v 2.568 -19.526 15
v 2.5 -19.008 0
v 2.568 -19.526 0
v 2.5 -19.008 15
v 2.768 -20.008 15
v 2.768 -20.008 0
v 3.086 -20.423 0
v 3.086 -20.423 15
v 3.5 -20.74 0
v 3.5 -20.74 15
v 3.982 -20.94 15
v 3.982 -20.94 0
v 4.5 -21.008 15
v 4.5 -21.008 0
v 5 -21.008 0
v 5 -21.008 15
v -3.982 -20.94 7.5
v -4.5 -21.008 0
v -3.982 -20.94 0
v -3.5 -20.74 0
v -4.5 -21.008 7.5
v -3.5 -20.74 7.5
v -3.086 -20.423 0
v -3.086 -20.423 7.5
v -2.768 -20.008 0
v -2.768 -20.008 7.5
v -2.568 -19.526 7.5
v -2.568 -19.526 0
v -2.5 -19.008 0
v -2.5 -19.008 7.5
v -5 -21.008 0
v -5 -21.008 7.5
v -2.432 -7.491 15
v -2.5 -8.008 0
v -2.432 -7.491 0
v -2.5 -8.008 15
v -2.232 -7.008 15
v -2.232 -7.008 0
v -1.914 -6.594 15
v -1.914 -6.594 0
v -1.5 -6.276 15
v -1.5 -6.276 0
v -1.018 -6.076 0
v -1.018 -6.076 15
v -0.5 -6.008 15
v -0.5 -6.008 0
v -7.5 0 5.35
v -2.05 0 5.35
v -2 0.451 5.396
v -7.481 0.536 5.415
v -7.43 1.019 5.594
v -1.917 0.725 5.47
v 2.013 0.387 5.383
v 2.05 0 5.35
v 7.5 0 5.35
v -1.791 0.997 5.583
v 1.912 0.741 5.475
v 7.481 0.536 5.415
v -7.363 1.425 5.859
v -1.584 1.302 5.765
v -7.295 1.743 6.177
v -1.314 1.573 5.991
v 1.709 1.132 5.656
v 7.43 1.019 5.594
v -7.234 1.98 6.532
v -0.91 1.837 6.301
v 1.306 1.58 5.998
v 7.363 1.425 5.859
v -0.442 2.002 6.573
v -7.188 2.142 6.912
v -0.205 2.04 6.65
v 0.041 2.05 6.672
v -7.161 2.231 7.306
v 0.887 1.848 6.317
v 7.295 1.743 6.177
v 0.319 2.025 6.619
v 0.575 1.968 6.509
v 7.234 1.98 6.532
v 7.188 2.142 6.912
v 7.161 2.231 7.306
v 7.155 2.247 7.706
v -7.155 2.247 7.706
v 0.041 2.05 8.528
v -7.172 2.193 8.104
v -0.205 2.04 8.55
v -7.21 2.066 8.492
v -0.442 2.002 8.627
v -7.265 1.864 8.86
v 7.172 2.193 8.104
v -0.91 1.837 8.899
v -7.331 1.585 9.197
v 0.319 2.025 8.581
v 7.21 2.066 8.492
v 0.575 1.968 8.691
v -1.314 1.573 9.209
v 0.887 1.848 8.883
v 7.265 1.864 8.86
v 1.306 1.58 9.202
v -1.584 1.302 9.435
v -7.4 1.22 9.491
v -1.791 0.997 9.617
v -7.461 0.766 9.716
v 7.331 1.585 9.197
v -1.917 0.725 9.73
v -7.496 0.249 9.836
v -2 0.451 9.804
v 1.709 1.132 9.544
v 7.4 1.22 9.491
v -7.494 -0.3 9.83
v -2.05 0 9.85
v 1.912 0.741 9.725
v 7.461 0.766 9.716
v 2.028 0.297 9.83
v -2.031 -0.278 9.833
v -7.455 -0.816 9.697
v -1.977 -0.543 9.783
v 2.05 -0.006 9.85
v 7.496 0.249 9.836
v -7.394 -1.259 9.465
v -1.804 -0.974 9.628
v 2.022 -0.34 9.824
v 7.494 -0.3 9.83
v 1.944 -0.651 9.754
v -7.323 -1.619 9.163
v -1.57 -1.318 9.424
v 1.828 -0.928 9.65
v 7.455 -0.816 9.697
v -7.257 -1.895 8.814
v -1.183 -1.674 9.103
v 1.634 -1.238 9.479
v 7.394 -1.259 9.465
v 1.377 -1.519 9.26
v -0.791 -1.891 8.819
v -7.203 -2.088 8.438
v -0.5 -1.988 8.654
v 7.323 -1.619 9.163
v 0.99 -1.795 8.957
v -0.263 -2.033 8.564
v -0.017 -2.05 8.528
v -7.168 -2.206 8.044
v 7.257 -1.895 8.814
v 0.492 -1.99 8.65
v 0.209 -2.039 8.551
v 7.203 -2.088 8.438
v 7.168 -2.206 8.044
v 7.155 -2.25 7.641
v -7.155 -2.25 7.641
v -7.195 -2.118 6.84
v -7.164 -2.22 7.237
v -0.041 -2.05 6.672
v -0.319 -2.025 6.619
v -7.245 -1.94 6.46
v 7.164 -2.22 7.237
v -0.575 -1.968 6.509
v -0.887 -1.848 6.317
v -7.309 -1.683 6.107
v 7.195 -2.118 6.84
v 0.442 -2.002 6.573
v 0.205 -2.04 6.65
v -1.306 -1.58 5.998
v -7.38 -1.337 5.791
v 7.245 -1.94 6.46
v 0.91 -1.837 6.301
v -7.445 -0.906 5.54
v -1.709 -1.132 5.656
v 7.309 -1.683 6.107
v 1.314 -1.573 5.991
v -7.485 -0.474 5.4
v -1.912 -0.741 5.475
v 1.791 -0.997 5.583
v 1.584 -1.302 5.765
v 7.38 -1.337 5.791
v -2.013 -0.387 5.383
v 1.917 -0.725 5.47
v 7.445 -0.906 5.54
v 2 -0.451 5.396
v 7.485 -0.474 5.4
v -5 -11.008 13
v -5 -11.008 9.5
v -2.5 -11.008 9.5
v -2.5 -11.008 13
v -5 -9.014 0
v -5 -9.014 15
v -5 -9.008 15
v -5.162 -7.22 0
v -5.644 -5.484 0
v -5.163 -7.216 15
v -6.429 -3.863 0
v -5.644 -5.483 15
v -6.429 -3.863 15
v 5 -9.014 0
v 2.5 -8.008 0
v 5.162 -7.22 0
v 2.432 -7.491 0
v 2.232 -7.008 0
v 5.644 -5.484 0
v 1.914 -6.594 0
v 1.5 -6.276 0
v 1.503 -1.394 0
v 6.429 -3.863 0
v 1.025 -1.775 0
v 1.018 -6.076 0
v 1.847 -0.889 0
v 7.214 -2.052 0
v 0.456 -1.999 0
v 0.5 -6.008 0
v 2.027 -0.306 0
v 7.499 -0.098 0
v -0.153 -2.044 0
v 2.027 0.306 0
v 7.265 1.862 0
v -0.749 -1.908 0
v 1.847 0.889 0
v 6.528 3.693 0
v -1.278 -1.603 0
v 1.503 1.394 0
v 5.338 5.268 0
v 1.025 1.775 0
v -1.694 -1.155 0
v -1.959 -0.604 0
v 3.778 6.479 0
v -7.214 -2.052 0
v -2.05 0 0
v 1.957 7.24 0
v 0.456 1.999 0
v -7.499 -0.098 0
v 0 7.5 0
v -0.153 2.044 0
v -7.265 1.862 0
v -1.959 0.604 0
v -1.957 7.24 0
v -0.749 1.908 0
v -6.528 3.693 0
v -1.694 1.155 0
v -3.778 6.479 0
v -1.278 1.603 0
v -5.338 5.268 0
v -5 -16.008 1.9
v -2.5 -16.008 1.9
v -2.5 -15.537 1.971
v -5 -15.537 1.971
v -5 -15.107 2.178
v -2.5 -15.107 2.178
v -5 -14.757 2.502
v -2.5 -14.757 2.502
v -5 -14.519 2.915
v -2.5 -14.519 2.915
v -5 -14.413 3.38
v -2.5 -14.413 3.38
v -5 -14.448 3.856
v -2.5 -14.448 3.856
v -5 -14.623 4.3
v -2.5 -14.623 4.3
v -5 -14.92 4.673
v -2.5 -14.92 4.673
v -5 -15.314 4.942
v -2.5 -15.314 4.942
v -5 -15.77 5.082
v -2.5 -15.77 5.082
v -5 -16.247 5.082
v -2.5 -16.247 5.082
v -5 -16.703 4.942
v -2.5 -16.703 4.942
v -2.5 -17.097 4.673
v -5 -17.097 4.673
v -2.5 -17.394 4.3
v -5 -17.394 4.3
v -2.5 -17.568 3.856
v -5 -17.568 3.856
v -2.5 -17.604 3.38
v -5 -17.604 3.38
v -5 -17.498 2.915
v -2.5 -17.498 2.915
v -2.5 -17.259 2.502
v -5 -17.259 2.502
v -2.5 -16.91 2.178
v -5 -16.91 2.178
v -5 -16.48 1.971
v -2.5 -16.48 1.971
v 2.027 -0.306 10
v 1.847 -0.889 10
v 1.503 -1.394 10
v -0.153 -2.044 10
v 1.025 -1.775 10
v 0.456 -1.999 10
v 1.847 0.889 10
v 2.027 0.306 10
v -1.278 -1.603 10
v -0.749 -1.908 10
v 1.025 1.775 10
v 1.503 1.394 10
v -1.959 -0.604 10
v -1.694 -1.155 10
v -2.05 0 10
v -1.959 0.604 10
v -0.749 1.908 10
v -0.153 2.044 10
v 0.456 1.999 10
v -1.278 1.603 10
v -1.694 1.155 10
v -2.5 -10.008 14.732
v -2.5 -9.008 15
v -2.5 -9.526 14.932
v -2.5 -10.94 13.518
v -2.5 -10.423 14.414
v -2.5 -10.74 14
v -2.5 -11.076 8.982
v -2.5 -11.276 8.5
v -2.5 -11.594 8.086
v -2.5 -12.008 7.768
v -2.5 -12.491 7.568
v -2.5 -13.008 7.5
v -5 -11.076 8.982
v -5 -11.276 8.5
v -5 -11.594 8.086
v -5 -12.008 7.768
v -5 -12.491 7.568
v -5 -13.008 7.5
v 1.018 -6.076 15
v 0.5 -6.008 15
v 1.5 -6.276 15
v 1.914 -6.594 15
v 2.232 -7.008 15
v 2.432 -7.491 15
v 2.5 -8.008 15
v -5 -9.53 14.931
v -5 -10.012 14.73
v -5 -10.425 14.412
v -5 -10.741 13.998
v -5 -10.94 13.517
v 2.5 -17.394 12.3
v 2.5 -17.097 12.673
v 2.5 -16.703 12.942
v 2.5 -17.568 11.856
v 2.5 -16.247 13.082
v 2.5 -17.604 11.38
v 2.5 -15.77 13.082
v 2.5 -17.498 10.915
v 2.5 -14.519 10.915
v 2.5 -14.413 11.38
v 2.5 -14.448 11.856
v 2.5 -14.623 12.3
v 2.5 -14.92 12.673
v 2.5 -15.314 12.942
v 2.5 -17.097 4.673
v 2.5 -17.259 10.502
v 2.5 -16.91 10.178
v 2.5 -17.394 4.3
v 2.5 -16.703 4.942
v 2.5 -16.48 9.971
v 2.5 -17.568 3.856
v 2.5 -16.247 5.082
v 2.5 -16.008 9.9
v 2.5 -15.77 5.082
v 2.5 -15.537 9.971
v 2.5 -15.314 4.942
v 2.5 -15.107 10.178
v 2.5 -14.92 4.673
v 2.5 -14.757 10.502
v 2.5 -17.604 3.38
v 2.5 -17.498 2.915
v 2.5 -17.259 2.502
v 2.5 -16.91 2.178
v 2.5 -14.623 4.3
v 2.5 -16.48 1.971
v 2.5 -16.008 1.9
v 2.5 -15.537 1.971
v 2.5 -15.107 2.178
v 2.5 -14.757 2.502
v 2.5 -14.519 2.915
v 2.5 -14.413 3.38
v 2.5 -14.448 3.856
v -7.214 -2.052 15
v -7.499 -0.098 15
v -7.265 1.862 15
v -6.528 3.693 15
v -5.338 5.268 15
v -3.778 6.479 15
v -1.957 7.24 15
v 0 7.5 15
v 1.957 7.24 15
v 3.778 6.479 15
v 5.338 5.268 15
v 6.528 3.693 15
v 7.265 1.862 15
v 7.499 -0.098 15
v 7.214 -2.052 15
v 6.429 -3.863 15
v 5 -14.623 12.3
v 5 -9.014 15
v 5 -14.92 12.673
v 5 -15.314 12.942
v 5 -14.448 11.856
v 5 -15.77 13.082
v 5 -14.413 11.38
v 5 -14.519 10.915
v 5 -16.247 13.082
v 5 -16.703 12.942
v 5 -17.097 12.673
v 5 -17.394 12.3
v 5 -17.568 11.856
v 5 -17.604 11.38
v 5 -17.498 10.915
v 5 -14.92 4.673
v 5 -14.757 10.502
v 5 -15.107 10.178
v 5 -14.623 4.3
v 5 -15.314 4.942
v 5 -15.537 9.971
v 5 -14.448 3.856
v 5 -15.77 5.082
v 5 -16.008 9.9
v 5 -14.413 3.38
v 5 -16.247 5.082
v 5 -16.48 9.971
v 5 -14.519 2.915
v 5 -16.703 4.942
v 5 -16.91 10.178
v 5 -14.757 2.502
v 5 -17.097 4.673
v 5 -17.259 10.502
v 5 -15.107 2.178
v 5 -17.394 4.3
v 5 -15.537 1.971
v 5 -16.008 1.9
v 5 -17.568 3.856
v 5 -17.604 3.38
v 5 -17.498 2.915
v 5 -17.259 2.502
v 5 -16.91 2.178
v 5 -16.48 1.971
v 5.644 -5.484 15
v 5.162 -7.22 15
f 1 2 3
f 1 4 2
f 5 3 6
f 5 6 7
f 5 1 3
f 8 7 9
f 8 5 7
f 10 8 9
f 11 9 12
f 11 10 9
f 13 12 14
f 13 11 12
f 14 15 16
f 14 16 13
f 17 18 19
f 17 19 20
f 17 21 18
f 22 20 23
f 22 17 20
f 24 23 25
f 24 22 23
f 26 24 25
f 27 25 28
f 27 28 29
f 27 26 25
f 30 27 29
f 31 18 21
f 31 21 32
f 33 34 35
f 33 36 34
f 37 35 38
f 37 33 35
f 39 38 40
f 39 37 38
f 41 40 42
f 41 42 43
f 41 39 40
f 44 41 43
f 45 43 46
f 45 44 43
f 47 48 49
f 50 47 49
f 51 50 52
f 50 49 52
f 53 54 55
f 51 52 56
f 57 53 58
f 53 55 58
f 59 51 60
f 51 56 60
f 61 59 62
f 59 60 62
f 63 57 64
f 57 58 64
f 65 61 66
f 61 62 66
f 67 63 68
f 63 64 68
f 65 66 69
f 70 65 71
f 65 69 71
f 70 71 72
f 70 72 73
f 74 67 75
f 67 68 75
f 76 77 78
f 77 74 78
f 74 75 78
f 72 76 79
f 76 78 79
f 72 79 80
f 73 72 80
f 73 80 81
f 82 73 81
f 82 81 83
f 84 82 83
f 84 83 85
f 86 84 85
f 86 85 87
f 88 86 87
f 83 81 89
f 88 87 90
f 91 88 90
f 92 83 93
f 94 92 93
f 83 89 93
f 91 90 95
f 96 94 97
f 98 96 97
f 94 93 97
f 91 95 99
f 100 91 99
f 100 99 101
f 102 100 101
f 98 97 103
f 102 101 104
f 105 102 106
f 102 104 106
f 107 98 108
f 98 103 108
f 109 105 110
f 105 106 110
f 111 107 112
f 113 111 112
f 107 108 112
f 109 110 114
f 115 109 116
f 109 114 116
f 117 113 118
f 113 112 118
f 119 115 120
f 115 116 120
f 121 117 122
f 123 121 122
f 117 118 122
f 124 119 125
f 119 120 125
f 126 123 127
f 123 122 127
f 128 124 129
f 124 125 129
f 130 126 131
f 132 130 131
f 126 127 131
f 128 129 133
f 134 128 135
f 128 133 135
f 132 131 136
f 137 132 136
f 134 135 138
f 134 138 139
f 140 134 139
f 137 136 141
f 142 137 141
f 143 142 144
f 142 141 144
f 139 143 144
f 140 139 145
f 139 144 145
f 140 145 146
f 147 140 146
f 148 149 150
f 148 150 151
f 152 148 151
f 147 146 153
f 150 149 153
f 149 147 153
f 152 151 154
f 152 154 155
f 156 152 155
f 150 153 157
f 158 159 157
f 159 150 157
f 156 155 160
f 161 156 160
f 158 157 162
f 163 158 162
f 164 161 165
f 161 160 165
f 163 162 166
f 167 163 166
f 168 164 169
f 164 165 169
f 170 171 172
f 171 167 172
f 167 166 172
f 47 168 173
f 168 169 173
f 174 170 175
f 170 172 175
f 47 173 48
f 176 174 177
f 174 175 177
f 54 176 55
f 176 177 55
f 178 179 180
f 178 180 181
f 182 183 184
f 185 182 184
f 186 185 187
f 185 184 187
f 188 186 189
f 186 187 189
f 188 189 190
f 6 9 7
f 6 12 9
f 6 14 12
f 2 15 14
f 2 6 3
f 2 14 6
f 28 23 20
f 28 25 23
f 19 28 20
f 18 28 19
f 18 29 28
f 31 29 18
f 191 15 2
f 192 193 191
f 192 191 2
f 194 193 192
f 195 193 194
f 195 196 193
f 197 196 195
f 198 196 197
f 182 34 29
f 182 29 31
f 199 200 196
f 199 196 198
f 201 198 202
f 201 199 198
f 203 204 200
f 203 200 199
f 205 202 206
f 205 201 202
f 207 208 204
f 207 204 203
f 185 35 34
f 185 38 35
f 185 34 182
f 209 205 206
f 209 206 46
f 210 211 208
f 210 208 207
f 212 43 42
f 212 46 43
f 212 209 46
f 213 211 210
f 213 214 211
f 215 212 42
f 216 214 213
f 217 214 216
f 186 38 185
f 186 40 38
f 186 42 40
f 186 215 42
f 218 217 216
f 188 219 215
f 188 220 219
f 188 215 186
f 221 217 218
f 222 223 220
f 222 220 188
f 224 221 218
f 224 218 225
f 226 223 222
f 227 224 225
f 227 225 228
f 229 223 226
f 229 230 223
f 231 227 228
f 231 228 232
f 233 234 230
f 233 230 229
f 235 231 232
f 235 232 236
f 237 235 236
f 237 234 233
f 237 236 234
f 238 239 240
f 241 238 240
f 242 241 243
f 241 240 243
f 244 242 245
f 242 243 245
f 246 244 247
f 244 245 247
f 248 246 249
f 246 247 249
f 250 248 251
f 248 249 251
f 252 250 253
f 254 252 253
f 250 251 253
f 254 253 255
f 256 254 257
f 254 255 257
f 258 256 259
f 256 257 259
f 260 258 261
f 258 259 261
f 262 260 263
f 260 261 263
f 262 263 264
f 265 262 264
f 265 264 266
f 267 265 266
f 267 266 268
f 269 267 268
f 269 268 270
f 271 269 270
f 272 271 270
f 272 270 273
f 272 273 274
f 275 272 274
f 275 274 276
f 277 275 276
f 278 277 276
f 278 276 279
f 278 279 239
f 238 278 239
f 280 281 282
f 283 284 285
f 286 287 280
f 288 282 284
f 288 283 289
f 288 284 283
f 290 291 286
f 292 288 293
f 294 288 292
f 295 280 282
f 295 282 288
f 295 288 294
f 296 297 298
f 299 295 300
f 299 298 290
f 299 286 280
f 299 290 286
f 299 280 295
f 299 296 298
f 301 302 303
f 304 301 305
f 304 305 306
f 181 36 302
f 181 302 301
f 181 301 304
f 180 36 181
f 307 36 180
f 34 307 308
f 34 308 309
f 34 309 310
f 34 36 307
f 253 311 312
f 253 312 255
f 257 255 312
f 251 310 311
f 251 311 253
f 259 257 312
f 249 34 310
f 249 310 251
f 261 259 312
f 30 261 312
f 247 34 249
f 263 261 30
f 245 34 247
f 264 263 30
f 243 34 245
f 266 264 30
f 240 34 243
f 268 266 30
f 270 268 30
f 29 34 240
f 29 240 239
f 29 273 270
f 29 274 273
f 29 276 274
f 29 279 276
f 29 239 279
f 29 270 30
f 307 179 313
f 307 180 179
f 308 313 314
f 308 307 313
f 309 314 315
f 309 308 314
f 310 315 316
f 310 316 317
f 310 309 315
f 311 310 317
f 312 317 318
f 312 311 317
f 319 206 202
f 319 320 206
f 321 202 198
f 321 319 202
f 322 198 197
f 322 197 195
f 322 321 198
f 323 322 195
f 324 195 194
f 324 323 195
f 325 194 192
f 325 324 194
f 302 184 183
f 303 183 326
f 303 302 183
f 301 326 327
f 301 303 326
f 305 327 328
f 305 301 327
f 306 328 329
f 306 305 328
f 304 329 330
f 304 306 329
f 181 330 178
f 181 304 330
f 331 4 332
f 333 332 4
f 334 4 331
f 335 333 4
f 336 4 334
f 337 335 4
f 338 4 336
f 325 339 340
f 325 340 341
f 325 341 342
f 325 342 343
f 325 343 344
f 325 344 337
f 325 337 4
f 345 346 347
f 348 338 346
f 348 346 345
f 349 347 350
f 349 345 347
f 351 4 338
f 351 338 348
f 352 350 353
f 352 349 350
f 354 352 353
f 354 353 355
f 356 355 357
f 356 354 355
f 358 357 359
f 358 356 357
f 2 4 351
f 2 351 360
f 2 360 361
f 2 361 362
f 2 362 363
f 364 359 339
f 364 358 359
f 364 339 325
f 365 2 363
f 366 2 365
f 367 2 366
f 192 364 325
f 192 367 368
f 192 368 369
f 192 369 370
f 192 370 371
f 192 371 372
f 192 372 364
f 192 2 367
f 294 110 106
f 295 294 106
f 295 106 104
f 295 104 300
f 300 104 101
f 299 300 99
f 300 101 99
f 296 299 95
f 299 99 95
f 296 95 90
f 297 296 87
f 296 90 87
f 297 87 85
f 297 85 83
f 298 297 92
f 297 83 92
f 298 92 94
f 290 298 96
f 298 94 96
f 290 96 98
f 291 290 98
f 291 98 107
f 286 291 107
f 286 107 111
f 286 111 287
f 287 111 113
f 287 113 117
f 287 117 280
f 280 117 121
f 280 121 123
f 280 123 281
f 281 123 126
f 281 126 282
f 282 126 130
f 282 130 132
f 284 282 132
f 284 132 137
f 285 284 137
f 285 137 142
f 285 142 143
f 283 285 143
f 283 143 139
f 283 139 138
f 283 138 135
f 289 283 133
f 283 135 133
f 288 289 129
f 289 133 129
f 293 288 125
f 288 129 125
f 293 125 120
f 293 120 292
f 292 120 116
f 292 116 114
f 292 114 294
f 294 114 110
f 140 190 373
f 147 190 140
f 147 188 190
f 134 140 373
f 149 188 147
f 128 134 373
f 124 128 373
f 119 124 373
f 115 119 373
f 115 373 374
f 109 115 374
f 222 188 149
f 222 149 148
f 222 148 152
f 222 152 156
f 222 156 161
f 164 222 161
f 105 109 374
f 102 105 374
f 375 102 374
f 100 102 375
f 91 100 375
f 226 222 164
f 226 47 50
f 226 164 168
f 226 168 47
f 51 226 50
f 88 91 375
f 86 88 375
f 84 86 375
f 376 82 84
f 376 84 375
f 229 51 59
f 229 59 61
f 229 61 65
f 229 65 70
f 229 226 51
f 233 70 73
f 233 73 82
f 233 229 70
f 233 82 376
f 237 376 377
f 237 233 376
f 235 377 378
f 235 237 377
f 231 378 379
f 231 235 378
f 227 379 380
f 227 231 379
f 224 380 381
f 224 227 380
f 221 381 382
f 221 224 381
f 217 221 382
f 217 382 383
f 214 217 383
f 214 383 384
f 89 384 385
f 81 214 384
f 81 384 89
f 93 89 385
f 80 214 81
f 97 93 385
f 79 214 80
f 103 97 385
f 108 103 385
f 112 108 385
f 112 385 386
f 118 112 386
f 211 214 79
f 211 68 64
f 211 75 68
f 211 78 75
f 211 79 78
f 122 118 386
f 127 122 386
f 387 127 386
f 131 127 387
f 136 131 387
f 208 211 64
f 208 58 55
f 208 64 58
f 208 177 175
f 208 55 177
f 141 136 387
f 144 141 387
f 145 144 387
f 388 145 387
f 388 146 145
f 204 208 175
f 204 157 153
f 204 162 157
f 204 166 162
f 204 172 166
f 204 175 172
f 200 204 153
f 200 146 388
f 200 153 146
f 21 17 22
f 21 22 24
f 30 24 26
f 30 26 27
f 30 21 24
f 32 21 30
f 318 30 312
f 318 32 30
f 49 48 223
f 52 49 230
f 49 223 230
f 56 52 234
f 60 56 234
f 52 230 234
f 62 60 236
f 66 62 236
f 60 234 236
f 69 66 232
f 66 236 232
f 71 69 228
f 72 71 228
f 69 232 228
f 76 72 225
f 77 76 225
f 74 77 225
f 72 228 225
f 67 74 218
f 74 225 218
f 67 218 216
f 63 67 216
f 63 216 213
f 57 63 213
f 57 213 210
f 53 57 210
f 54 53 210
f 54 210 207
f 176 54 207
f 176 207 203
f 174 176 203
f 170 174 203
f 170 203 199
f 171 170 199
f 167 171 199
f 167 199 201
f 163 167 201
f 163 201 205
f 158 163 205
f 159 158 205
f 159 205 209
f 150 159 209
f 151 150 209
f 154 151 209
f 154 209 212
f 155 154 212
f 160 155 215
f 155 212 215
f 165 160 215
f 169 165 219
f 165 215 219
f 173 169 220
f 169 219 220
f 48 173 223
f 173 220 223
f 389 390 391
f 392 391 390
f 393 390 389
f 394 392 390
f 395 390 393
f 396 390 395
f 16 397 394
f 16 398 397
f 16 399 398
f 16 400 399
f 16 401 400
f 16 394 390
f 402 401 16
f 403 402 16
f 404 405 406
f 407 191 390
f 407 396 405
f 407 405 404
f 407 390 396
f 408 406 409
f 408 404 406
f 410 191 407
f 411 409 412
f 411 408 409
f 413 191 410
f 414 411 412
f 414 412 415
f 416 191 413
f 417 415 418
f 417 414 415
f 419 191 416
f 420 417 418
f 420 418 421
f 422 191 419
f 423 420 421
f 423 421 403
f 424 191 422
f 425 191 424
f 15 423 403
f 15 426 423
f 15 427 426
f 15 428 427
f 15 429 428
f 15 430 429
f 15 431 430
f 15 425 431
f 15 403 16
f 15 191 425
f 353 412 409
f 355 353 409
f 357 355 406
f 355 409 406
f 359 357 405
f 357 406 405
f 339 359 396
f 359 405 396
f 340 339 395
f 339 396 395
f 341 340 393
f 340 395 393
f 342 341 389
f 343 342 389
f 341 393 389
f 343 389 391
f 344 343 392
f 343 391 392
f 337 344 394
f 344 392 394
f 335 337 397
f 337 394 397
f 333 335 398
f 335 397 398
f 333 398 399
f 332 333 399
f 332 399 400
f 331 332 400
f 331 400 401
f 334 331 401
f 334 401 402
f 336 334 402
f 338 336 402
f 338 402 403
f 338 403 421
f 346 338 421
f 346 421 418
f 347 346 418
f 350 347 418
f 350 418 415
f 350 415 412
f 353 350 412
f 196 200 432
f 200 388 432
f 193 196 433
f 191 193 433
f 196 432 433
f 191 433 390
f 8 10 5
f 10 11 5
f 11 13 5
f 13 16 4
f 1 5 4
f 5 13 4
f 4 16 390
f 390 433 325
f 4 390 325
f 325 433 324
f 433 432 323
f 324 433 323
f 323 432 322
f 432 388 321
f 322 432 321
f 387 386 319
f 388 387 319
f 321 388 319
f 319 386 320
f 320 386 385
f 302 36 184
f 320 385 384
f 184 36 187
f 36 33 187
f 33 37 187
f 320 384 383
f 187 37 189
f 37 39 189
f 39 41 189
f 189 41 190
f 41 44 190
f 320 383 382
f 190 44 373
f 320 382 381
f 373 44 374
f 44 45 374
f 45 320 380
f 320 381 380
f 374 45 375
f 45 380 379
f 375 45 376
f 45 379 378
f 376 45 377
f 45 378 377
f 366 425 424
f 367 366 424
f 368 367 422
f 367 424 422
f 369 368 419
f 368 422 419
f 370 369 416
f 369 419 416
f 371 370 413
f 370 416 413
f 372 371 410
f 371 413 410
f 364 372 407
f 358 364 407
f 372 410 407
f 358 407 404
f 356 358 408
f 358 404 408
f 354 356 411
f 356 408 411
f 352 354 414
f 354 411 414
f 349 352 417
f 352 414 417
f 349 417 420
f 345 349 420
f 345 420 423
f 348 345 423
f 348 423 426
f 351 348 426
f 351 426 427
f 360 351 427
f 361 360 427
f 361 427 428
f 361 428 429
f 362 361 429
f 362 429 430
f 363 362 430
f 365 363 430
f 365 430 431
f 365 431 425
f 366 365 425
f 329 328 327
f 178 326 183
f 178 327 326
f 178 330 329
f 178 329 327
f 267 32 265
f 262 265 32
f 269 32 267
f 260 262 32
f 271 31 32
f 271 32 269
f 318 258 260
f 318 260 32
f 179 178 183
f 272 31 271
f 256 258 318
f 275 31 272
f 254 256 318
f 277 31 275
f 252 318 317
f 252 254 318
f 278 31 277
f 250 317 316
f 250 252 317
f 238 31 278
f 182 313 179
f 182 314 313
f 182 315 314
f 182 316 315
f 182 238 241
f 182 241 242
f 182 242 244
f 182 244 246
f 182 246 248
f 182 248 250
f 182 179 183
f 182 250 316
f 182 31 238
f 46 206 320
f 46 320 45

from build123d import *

# Parameters (mm, degrees)
BOSS_EXTRUDE1_DEPTH = 15
FILLET2_R           = 10
SKETCH8_R           = 1.6
CUT_EXTRUDE6_DEPTH  = 29.681007074
CUT_EXTRUDE7_REACH  = 30.681
SKETCH9_W           = 7.5
SKETCH9_H           = 10
CUT_EXTRUDE8_REACH  = 30.681
SKETCH10_R          = 1.6
FILLET3_R           = 2
FILLET6_R           = 2
SKETCH11_R          = 2.05
CUT_EXTRUDE9_DEPTH  = 10
SKETCH12_R          = 2.25
CUT_EXTRUDE10_DEPTH = 14.5


with BuildPart() as part:
    # Sketch2 → Boss-Extrude1 (new body)
    with BuildSketch(Plane.XY):
        with BuildLine():
            Line((-2.5, -6.008335649), (-2.5, -21.008335649))
            Line((-2.5, -21.008335649), (-5, -21.008335649))
            Line((-5, -21.008335649), (-5, -6.008335649))
            Line((-5, -6.008335649), (-5, -5.590169944))
            ThreePointArc((-5, -5.590169944), (0, 7.5), (5, -5.590169944))
            Line((5, -5.590169944), (5, -6.008335649))
            Line((5, -6.008335649), (5, -21.008335649))
            Line((5, -21.008335649), (2.5, -21.008335649))
            Line((2.5, -21.008335649), (2.5, -6.008335649))
            Line((2.5, -6.008335649), (-2.5, -6.008335649))
        make_face()
    extrude(amount=BOSS_EXTRUDE1_DEPTH)

    # Fillet2
    fillet2_edges = [part.edges().sort_by_distance(p)[0] for p in [
        (-5, -5.590169944, 7.5),
        (5, -5.590169944, 7.5),
    ]]
    fillet(fillet2_edges, radius=FILLET2_R)

    # Sketch8 → Cut-Extrude6 (cut, through all)
    with BuildSketch(Plane(origin=(5, 0, 0), x_dir=(0, 0, -1), z_dir=(1, 0, 0))):
        with Locations((-3.5, -16.008335649)):
            Circle(SKETCH8_R)
    extrude(amount=-CUT_EXTRUDE6_DEPTH, mode=Mode.SUBTRACT)

    # Sketch9 → Cut-Extrude7 (cut, up to next)
    with BuildSketch(Plane.ZY.offset(5), mode=Mode.PRIVATE) as cut_extrude7_sk1:
        with Locations((11.25, -16.008335649)):
            Rectangle(SKETCH9_W, SKETCH9_H)
    cut_extrude7_tool1 = extrude(cut_extrude7_sk1.sketch, amount=-CUT_EXTRUDE7_REACH, mode=Mode.PRIVATE) & part.part
    add(cut_extrude7_tool1.solids().sort_by_distance((-5, -16.008336, 11.25))[0], mode=Mode.SUBTRACT)

    # Sketch10 → Cut-Extrude8 (cut, up to next)
    with BuildSketch(Plane(origin=(5, 0, 0), x_dir=(0, 0, -1), z_dir=(1, 0, 0)), mode=Mode.PRIVATE) as cut_extrude8_sk1:
        with Locations((-11.5, -16.008335649)):
            Circle(SKETCH10_R)
    cut_extrude8_tool1 = extrude(cut_extrude8_sk1.sketch, amount=-CUT_EXTRUDE8_REACH, mode=Mode.PRIVATE) & part.part
    add(cut_extrude8_tool1.solids().sort_by_distance((5, -16.008336, 11.5))[0], mode=Mode.SUBTRACT)

    # Fillet3
    fillet3_edges = [part.edges().sort_by_distance(p)[0] for p in [
        (-2.5, -6.008335649, 7.5),
        (2.5, -21.008335649, 7.5),
        (2.5, -6.008335649, 7.5),
        (-2.5, -21.008335649, 3.75),
    ]]
    fillet(fillet3_edges, radius=FILLET3_R)

    # Fillet6
    fillet6_edges = [part.edges().sort_by_distance(p)[0] for p in [
        (-3.75, -11.008335649, 15),
        (-3.75, -11.008335649, 7.5),
    ]]
    fillet(fillet6_edges, radius=FILLET6_R)

    # Sketch11 → Cut-Extrude9 (cut)
    with BuildSketch(Plane(origin=(0, 0, 0), x_dir=(-1, 0, 0), z_dir=(0, 0, -1))):
        Circle(SKETCH11_R)
    extrude(amount=-CUT_EXTRUDE9_DEPTH, mode=Mode.SUBTRACT)

    # Sketch12 → Cut-Extrude10 (cut, symmetric)
    with BuildSketch(Plane(origin=(5, 0, 0), x_dir=(0, 0, -1), z_dir=(1, 0, 0))):
        with Locations((-7.6, 0)):
            Circle(SKETCH12_R)
    extrude(amount=CUT_EXTRUDE10_DEPTH, both=True, mode=Mode.SUBTRACT)


solid = part.part
